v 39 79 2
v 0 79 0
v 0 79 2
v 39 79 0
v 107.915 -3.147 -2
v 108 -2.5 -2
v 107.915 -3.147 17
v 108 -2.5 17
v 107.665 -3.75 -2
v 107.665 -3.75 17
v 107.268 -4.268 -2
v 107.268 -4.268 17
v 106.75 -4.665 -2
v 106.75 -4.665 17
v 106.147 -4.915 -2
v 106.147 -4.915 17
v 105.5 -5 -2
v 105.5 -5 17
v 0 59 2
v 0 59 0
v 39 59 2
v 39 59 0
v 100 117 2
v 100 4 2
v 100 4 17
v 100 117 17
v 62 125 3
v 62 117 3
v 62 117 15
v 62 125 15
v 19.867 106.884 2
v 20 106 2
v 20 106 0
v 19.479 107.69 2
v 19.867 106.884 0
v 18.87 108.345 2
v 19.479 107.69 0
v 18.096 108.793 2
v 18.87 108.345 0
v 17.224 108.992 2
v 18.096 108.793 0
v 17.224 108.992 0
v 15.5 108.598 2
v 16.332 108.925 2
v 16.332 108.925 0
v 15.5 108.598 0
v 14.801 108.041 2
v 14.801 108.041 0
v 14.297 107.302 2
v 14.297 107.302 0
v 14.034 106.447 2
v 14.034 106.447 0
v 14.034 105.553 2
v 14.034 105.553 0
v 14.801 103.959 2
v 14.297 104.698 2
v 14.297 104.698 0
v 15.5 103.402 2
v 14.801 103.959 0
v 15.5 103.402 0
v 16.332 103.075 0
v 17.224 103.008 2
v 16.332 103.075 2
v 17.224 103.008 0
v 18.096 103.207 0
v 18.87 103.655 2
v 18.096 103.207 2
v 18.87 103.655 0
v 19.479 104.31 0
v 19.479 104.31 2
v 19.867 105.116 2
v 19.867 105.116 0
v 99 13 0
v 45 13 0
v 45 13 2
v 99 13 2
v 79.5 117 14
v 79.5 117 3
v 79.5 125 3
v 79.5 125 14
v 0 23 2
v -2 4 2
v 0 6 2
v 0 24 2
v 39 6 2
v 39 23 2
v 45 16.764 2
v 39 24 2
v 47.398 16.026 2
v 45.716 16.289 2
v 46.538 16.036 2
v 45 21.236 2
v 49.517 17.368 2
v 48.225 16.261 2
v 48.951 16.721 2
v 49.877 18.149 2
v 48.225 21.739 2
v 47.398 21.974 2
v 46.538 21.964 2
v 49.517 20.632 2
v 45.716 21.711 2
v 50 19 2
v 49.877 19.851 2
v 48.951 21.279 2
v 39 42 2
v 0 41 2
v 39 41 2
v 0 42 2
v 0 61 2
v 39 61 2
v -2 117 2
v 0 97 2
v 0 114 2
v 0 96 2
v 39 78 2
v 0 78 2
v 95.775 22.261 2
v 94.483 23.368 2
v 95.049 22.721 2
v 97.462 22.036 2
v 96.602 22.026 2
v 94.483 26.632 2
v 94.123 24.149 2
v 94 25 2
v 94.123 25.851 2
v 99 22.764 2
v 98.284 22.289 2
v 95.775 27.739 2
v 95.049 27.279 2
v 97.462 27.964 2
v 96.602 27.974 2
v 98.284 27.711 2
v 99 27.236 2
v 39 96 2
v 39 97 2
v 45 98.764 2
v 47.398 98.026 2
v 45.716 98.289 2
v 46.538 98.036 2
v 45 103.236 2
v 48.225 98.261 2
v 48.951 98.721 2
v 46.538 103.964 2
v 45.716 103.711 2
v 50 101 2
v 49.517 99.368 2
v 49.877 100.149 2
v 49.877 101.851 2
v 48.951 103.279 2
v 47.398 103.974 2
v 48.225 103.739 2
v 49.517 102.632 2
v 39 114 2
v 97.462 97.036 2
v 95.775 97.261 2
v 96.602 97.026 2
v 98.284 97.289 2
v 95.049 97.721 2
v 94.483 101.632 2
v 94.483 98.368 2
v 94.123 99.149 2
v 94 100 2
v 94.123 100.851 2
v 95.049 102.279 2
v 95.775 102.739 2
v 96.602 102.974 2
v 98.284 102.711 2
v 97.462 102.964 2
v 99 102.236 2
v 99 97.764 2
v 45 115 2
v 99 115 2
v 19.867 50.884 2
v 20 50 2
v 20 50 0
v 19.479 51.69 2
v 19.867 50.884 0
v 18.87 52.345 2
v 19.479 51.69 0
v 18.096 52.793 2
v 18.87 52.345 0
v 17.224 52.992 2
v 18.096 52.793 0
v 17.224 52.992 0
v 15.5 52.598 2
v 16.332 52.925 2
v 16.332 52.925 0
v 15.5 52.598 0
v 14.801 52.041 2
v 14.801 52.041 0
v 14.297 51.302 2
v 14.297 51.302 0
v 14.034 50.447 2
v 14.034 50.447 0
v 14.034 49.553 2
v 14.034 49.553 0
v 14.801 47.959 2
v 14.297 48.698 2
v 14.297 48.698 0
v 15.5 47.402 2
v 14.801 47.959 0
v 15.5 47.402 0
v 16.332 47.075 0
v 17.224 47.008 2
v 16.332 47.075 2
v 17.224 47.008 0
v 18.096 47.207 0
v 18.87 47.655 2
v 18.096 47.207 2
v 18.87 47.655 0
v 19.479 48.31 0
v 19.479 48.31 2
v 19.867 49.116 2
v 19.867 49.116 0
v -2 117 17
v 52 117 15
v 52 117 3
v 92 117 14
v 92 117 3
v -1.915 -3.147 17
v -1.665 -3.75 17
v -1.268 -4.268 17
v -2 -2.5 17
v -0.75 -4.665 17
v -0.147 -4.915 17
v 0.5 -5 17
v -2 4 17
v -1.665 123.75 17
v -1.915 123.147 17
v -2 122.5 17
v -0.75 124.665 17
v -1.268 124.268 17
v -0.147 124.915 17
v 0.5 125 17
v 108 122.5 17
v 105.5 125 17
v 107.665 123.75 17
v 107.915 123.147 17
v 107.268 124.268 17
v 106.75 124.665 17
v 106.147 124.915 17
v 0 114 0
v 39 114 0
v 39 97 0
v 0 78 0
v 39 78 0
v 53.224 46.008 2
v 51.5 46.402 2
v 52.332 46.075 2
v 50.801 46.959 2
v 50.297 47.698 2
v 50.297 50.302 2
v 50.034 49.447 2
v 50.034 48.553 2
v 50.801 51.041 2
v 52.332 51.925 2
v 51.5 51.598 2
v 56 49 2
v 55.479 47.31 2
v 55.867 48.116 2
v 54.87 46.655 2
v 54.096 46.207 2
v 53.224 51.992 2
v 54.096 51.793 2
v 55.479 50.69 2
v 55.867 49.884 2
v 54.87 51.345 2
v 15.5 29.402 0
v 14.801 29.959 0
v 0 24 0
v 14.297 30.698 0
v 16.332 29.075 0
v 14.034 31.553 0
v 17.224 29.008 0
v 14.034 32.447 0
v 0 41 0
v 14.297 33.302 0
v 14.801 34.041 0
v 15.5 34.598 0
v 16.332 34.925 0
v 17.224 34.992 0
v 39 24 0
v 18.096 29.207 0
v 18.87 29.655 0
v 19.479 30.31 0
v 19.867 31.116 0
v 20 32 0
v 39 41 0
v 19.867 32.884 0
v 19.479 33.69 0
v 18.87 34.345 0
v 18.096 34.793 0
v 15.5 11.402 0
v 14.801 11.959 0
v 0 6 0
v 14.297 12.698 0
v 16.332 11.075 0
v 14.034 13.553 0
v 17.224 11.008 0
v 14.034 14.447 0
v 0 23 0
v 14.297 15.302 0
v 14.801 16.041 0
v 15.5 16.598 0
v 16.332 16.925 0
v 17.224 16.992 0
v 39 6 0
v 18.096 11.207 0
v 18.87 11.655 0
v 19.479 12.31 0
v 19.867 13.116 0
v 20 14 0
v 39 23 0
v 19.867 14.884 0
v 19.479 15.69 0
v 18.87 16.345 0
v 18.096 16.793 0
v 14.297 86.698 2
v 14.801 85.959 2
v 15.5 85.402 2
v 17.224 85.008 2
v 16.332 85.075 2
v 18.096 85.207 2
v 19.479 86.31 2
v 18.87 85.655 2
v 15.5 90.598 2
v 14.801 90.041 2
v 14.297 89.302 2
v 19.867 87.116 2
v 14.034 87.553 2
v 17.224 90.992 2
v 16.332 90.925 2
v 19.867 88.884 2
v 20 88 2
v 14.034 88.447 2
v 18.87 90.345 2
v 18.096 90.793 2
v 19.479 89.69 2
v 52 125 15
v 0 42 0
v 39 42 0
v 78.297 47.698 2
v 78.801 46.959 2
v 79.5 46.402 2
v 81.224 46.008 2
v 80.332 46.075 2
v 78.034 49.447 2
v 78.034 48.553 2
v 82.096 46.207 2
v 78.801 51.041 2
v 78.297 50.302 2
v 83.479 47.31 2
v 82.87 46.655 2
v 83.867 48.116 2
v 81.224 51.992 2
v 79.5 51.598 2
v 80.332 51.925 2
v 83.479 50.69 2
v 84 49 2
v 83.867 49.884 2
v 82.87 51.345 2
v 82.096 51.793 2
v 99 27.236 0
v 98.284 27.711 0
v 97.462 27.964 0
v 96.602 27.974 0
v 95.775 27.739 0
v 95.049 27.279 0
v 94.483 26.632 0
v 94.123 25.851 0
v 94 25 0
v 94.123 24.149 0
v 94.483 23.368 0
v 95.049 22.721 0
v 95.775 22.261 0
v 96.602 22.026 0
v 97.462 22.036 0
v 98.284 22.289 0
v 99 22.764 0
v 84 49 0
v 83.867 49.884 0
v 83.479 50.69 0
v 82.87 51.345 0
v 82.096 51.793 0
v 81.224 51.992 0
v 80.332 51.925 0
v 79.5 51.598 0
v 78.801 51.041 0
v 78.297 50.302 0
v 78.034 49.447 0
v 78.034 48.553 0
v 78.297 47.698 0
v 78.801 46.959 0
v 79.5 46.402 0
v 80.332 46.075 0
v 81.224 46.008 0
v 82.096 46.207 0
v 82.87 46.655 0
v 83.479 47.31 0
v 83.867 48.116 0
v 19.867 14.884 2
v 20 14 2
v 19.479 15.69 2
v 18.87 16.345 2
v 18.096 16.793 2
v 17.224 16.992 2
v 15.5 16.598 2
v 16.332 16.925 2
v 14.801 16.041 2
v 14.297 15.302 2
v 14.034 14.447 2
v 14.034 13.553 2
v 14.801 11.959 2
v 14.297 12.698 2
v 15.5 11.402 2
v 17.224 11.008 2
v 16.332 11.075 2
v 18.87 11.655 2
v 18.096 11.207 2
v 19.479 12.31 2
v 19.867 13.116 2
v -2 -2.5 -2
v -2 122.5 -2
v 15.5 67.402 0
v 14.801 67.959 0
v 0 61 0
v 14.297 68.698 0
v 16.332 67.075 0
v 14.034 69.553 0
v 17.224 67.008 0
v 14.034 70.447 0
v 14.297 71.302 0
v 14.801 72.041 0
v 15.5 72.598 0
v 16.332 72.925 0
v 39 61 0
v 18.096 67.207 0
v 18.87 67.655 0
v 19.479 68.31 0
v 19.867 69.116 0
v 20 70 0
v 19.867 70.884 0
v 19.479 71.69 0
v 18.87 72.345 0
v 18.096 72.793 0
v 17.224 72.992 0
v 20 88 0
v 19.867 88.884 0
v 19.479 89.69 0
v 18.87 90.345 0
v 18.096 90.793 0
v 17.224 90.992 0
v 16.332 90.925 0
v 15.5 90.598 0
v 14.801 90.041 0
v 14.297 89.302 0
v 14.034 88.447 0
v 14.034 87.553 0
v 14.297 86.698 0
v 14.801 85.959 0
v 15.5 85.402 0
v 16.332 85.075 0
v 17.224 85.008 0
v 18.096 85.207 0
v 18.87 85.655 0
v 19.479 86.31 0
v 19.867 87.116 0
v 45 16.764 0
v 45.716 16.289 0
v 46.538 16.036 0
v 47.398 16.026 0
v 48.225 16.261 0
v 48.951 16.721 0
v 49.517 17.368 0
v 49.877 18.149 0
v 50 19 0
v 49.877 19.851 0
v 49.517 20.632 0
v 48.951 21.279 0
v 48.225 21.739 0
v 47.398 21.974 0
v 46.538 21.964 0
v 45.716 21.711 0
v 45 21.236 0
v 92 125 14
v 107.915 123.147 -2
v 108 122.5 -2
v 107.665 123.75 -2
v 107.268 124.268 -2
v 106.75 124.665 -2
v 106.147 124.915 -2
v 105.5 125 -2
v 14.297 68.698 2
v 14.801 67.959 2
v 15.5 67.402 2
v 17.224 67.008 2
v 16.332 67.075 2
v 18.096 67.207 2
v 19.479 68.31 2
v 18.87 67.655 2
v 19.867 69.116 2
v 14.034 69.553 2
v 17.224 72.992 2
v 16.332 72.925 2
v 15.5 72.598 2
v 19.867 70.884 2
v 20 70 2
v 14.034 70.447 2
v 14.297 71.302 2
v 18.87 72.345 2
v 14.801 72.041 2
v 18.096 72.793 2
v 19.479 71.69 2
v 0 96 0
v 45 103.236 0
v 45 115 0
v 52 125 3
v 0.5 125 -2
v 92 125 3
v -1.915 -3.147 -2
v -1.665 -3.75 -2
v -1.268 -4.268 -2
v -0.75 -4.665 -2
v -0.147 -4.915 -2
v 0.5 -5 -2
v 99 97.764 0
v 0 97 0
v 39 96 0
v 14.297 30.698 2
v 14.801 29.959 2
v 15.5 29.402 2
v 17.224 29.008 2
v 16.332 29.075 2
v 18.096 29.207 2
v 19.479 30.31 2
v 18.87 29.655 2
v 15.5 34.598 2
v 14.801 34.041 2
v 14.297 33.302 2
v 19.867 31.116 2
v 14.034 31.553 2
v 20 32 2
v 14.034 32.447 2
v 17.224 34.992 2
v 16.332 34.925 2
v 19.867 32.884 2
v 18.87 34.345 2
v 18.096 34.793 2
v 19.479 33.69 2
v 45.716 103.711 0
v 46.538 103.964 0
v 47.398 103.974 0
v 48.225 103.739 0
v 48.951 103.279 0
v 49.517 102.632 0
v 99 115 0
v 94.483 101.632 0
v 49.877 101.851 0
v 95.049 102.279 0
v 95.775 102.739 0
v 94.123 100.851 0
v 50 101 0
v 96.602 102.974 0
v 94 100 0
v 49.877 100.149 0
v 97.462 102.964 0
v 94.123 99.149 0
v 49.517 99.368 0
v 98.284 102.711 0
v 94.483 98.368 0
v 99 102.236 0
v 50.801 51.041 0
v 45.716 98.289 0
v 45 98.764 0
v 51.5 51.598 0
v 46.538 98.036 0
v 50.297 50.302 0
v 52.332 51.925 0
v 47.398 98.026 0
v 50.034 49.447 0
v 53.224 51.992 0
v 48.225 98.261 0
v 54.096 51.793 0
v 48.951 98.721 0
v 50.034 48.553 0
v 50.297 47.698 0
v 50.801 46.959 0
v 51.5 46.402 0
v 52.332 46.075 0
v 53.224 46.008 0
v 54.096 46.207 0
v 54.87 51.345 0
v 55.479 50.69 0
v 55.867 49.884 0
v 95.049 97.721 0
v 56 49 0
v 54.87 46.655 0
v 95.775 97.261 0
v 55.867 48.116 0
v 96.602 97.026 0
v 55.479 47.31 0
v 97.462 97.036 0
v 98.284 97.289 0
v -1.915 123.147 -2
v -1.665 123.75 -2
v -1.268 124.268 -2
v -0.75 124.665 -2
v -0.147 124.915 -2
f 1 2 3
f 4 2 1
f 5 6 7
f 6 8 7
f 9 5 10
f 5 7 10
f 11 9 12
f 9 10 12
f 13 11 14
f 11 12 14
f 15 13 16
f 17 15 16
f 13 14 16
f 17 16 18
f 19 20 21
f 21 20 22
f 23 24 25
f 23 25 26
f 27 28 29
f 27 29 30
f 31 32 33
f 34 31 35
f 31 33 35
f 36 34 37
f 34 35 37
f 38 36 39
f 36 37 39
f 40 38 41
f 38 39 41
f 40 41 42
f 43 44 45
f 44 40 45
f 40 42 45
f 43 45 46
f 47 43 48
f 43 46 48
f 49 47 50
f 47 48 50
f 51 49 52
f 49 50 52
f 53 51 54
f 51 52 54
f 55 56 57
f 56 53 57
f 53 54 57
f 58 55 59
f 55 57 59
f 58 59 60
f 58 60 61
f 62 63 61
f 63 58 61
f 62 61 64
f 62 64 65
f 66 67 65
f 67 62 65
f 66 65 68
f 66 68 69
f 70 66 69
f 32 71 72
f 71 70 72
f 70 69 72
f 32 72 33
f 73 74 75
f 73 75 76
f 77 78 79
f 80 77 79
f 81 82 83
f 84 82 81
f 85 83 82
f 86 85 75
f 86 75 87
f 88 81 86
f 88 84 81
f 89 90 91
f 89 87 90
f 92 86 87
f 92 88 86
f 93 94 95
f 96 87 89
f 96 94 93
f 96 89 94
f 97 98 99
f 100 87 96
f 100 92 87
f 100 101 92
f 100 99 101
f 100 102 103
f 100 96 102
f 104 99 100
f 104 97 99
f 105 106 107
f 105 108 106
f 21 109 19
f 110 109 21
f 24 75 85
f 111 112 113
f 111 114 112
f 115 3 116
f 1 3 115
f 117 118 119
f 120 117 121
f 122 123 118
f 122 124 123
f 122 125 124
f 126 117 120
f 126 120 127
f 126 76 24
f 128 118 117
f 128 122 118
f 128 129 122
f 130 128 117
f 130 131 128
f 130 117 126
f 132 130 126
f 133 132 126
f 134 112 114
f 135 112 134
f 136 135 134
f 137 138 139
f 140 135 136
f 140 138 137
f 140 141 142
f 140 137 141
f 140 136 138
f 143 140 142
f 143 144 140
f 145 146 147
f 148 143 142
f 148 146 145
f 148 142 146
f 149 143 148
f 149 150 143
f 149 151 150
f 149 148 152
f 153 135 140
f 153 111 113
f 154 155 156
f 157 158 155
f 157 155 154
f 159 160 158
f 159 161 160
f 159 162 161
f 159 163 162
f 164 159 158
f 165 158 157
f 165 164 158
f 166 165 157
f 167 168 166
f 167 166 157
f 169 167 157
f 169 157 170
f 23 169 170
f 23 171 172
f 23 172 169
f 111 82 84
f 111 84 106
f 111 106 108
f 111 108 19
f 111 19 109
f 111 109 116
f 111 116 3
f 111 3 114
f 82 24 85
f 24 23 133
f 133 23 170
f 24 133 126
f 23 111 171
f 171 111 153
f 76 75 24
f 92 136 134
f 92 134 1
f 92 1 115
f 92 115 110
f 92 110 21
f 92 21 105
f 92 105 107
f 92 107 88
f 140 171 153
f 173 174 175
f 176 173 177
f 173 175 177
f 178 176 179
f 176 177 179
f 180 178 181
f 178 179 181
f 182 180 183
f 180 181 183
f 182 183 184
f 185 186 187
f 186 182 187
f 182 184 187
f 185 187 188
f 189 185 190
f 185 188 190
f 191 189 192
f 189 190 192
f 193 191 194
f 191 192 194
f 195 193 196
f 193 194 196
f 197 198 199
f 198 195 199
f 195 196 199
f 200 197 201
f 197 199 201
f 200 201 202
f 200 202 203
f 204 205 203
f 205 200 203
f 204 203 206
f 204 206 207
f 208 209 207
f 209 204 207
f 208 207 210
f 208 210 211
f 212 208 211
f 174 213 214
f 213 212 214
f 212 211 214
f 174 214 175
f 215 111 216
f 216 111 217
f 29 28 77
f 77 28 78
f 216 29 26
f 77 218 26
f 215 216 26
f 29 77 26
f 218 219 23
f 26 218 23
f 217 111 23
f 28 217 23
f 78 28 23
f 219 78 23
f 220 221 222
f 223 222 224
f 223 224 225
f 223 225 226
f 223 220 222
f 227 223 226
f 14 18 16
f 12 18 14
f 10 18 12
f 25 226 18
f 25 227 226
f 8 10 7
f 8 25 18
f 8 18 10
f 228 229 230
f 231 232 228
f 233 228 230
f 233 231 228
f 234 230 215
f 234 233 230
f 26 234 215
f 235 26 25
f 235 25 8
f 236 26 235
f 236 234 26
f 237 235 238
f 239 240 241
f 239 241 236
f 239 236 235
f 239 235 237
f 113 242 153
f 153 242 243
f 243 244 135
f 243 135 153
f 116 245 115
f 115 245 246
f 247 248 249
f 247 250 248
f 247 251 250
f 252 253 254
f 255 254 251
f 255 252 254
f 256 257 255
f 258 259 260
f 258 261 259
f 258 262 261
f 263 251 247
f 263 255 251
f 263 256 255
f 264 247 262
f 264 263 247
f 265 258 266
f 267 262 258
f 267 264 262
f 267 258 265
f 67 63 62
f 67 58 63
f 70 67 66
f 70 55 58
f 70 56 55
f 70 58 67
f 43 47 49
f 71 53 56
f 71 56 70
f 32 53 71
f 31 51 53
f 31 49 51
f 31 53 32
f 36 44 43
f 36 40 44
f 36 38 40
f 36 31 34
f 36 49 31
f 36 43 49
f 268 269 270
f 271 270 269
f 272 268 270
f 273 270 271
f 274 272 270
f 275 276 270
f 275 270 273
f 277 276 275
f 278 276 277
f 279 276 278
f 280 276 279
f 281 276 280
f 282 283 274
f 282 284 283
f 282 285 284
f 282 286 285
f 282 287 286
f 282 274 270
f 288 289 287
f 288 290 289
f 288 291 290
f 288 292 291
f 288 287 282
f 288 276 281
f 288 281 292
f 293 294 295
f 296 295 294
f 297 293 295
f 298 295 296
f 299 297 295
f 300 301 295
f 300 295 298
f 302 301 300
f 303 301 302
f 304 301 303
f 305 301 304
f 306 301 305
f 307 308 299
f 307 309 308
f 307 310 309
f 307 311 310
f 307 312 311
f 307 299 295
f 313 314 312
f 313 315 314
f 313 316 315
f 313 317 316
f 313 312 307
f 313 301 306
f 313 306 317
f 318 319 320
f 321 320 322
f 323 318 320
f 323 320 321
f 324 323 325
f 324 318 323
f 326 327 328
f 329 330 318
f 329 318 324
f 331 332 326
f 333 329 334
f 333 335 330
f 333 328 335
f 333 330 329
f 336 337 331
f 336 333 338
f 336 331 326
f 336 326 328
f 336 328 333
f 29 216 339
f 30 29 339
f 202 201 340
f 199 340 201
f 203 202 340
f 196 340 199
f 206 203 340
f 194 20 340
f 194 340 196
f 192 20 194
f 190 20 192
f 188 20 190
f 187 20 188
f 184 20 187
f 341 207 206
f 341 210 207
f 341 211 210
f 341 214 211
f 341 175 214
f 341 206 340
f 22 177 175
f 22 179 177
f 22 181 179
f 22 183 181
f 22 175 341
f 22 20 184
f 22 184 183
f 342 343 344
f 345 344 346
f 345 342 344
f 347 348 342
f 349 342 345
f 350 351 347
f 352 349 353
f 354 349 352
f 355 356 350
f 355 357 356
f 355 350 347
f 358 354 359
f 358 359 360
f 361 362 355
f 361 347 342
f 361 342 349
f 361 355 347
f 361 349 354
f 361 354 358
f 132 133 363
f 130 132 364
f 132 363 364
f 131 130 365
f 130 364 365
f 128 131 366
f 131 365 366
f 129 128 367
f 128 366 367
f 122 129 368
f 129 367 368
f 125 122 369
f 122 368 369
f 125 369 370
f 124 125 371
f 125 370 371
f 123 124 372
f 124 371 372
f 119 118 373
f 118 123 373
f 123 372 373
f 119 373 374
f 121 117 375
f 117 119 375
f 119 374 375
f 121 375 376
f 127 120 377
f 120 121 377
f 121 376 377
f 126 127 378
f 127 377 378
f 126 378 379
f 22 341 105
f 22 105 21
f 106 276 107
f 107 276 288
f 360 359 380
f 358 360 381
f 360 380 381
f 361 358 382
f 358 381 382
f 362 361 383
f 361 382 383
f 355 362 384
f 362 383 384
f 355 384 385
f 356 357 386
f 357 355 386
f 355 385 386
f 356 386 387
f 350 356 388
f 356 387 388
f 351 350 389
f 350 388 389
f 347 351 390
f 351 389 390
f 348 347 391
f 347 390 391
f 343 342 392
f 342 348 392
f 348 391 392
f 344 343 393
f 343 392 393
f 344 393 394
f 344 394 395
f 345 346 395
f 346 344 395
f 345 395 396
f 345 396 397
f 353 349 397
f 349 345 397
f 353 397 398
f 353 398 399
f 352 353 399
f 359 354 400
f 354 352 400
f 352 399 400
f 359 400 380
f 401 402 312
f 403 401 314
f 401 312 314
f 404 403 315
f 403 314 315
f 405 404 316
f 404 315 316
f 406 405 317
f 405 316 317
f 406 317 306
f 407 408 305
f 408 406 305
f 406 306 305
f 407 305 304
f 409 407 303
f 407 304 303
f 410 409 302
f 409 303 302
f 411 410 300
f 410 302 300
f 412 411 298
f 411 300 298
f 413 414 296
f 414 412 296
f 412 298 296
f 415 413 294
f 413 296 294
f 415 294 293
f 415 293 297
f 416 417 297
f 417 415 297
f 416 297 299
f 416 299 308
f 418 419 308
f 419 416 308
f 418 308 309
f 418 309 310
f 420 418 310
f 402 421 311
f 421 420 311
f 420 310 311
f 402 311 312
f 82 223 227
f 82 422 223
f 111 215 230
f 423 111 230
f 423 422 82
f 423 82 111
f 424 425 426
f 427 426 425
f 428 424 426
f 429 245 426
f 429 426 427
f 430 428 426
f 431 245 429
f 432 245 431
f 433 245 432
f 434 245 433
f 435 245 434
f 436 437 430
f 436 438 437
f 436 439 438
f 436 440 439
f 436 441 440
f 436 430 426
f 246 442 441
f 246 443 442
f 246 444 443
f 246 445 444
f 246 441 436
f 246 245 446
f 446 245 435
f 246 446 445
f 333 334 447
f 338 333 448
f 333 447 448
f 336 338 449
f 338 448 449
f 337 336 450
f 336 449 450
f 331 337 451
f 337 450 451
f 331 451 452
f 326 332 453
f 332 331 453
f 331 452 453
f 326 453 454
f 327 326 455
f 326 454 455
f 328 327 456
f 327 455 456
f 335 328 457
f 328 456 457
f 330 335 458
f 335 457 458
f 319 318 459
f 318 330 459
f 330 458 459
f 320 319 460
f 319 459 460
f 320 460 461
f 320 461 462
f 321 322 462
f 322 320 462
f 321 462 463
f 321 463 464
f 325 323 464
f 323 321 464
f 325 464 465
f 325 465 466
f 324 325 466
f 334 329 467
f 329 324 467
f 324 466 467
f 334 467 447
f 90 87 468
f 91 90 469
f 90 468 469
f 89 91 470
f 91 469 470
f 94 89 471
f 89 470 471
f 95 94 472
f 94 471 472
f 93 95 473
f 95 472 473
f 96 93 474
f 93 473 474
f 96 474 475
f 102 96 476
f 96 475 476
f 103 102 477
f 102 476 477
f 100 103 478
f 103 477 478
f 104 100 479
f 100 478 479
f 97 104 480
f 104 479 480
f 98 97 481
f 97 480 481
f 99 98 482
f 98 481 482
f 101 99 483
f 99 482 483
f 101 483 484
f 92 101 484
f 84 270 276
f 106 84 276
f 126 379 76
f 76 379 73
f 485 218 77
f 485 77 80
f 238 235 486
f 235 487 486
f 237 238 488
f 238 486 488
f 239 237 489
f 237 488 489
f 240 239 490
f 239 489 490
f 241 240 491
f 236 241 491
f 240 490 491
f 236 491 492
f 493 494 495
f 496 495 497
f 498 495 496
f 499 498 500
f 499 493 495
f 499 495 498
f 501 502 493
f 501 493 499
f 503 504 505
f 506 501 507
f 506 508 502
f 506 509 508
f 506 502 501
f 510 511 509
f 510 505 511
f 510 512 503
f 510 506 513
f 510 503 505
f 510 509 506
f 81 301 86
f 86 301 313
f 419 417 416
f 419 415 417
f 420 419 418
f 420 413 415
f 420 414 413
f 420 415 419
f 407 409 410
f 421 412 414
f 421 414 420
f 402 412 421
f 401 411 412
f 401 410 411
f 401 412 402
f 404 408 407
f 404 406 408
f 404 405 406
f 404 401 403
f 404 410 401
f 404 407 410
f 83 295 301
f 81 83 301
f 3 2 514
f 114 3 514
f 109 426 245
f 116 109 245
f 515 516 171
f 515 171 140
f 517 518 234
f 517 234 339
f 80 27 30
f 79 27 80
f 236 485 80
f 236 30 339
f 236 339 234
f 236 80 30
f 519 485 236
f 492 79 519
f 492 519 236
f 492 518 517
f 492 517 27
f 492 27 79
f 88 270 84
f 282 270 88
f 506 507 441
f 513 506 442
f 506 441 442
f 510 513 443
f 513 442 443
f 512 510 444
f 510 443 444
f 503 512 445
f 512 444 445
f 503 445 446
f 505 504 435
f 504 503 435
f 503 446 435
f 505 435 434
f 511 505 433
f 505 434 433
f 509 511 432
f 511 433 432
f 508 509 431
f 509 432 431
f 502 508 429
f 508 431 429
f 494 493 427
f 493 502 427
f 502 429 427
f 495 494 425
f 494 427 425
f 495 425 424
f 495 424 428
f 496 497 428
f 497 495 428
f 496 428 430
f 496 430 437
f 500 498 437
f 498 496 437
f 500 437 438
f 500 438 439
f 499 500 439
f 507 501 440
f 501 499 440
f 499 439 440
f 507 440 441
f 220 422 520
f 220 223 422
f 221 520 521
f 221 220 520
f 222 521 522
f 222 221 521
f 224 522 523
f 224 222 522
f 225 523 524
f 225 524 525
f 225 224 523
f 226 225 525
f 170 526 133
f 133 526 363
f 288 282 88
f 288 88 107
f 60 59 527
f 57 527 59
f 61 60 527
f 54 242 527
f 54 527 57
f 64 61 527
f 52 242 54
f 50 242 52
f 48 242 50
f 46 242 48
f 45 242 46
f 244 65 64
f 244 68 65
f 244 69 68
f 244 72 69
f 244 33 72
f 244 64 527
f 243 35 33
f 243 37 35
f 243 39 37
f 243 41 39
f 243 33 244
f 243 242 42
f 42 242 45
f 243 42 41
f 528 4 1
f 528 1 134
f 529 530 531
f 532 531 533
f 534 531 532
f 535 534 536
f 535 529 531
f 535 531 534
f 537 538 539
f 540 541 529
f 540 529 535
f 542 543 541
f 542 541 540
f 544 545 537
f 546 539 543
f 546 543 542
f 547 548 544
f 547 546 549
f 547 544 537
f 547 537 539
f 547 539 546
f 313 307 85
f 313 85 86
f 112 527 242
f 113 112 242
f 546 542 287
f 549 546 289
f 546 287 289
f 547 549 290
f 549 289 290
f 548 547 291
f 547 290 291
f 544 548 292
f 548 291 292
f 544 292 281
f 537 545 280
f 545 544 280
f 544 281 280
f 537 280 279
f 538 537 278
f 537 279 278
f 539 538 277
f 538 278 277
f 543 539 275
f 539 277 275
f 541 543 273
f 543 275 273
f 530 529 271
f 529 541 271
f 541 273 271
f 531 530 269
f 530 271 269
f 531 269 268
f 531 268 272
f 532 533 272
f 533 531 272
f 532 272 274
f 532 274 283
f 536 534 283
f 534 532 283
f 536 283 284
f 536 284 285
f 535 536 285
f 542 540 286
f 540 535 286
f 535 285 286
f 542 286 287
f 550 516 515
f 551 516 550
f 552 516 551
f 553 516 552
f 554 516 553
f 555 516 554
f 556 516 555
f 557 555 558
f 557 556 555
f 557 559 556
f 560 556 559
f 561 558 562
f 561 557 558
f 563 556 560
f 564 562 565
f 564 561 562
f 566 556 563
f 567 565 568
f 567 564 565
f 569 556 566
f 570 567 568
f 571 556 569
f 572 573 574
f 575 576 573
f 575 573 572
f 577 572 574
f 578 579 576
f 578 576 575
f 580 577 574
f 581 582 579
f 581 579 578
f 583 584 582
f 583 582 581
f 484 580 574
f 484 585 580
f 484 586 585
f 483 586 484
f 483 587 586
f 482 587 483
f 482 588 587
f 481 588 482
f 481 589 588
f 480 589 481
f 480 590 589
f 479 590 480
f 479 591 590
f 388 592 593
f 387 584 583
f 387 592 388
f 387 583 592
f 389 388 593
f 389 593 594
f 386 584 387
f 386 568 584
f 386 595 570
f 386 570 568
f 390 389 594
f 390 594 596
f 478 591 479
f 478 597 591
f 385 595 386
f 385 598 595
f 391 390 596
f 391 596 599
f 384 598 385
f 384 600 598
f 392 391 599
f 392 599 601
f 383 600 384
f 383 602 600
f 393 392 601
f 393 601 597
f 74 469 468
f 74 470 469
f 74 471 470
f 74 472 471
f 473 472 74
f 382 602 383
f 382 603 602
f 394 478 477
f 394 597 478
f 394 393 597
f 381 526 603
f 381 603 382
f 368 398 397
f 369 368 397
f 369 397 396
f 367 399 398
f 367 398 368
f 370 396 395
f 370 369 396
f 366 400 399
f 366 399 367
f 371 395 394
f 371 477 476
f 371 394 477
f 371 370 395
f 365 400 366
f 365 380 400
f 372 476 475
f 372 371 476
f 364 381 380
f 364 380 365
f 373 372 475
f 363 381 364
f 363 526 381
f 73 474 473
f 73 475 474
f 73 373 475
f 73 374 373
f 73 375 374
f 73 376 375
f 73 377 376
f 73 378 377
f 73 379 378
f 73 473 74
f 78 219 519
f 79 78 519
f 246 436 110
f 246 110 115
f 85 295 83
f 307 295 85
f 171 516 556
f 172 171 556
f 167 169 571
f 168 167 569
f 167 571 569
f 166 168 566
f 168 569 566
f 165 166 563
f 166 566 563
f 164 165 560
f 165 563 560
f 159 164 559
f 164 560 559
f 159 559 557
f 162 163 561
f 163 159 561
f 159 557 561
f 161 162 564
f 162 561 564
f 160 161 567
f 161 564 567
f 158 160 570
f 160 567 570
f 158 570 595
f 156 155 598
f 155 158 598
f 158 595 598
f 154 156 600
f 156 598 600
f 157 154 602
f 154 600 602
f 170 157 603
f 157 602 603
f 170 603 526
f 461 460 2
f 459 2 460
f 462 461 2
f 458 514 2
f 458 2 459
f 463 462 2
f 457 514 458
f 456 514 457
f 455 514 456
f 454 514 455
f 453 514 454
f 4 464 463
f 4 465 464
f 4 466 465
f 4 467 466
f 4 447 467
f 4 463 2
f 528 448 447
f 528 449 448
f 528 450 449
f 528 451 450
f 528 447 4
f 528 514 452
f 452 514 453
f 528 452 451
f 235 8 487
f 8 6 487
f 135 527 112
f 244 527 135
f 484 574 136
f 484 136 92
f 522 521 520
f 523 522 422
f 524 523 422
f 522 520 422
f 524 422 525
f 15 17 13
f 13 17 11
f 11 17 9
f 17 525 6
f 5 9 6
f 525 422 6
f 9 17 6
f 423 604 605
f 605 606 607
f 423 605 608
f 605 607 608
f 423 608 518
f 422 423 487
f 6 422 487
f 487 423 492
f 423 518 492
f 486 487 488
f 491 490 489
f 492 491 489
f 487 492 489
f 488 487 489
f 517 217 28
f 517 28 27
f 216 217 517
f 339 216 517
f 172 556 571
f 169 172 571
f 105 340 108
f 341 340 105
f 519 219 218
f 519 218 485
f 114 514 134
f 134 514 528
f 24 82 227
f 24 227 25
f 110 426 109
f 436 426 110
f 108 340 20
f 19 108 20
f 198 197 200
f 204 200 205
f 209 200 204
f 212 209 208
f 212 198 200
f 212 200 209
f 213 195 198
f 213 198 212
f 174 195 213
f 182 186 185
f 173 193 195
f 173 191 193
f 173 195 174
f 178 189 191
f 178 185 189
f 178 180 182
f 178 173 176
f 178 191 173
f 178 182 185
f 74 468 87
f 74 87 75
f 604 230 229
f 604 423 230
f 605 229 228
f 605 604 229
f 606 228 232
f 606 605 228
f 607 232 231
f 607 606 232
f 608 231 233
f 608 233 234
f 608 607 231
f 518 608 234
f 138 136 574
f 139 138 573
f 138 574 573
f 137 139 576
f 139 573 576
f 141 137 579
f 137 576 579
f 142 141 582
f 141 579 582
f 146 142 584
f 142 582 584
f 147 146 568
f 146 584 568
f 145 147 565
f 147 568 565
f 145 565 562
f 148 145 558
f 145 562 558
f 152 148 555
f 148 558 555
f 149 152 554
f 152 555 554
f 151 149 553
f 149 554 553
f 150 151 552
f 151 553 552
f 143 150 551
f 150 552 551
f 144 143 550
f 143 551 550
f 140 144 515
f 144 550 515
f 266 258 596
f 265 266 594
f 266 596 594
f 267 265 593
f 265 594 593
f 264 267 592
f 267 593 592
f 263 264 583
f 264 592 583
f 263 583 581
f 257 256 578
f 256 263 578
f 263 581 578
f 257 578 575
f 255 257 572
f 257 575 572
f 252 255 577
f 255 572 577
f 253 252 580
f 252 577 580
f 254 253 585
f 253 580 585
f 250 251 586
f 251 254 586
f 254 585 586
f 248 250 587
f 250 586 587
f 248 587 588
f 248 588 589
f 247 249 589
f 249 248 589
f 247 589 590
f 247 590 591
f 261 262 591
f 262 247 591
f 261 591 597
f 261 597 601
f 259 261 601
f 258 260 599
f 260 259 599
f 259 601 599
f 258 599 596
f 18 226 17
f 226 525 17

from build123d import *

# Parameters (mm, degrees)
BOX009_W          = 20
BOX009_H          = 10
BOX009_DEPTH      = 12
BOX008_W          = 20
BOX008_H          = 12.5
BOX008_DEPTH      = 11
BOX011_W          = 102
BOX011_H          = 113
BOX011_DEPTH      = 21
BOX010_W          = 110
BOX010_H          = 130
BOX010_DEPTH      = 19
CYLINDER001_R     = 3
CYLINDER001_DEPTH = 20
BOX006_W          = 39
BOX006_H          = 17
BOX006_DEPTH      = 10
CYLINDER002_R     = 3
CYLINDER002_DEPTH = 20
BOX005_W          = 39
BOX005_H          = 17
BOX005_DEPTH      = 10
CYLINDER003_R     = 3
CYLINDER003_DEPTH = 20
BOX004_W          = 39
BOX004_H          = 17
BOX004_DEPTH      = 10
CYLINDER005_R     = 3
CYLINDER005_DEPTH = 20
BOX002_W          = 39
BOX002_H          = 17
BOX002_DEPTH      = 10
CYLINDER004_R     = 3
CYLINDER004_DEPTH = 20
BOX003_W          = 39
BOX003_H          = 17
BOX003_DEPTH      = 10
CYLINDER011_R     = 3
CYLINDER011_DEPTH = 20
CYLINDER010_R     = 3
CYLINDER010_DEPTH = 20
CYLINDER009_R     = 3
CYLINDER009_DEPTH = 20
CYLINDER008_R     = 3
CYLINDER008_DEPTH = 20
CYLINDER007_R     = 3
CYLINDER007_DEPTH = 20
CYLINDER006_R     = 3
CYLINDER006_DEPTH = 20
BOX007_W          = 102
BOX007_H          = 54
BOX007_DEPTH      = 10
CYLINDER_R        = 3
CYLINDER_DEPTH    = 20
BOX001_W          = 39
BOX001_H          = 17
BOX001_DEPTH      = 10
BOX_W             = 110
BOX_H             = 130
BOX_DEPTH         = 4
FILLET_R          = 2.5


with BuildPart() as dcport:
    # Box009 → Box009 (new body)
    with BuildSketch(Plane(origin=(62, 112, 3), x_dir=(0, 1, 0), z_dir=(0, 0, 1))):
        with Locations((10, 5)):
            Rectangle(BOX009_W, BOX009_H)
    extrude(amount=BOX009_DEPTH)


with BuildPart() as usbport:
    # Box008 → Box008 (new body)
    with BuildSketch(Plane(origin=(92, 112, 3), x_dir=(0, 1, 0), z_dir=(0, 0, 1))):
        with Locations((10, 6.25)):
            Rectangle(BOX008_W, BOX008_H)
    extrude(amount=BOX008_DEPTH)


with BuildPart() as wandung001:
    # Box011 → Box011 (new body)
    with BuildSketch(Plane(origin=(-2, 4, -2), x_dir=(1, 0, 0), z_dir=(0, 0, 1))):
        with Locations((51, 56.5)):
            Rectangle(BOX011_W, BOX011_H)
    extrude(amount=BOX011_DEPTH)


with BuildPart() as wandung003:
    # Box010 → Box010 (new body)
    with BuildSketch(Plane(origin=(-2, -5, -2), x_dir=(1, 0, 0), z_dir=(0, 0, 1))):
        with Locations((55, 65)):
            Rectangle(BOX010_W, BOX010_H)
    extrude(amount=BOX010_DEPTH)

    # Cut019: cut Wandung001
    add(wandung001.part, mode=Mode.SUBTRACT)

    # Cut020: cut Usbport
    add(usbport.part, mode=Mode.SUBTRACT)

    # Cut021: cut DCPort
    add(dcport.part, mode=Mode.SUBTRACT)


with BuildPart() as zylinder001:
    # Cylinder001 → Cylinder001 (new body)
    with BuildSketch(Plane(origin=(17, 32, 0), x_dir=(1, 0, 0), z_dir=(0, 0, 1))):
        Circle(CYLINDER001_R)
    extrude(amount=CYLINDER001_DEPTH)


with BuildPart() as cut001:
    # Box006 → Box006 (new body)
    with BuildSketch(Plane(origin=(0, 24, 0), x_dir=(1, 0, 0), z_dir=(0, 0, 1))):
        with Locations((19.5, 8.5)):
            Rectangle(BOX006_W, BOX006_H)
    extrude(amount=BOX006_DEPTH)

    # Cut001: cut Zylinder001
    add(zylinder001.part, mode=Mode.SUBTRACT)


with BuildPart() as zylinder002:
    # Cylinder002 → Cylinder002 (new body)
    with BuildSketch(Plane(origin=(17, 50, 0), x_dir=(1, 0, 0), z_dir=(0, 0, 1))):
        Circle(CYLINDER002_R)
    extrude(amount=CYLINDER002_DEPTH)


with BuildPart() as cut002:
    # Box005 → Box005 (new body)
    with BuildSketch(Plane(origin=(0, 42, 0), x_dir=(1, 0, 0), z_dir=(0, 0, 1))):
        with Locations((19.5, 8.5)):
            Rectangle(BOX005_W, BOX005_H)
    extrude(amount=BOX005_DEPTH)

    # Cut002: cut Zylinder002
    add(zylinder002.part, mode=Mode.SUBTRACT)


with BuildPart() as zylinder003:
    # Cylinder003 → Cylinder003 (new body)
    with BuildSketch(Plane(origin=(17, 106, 0), x_dir=(1, 0, 0), z_dir=(0, 0, 1))):
        Circle(CYLINDER003_R)
    extrude(amount=CYLINDER003_DEPTH)


with BuildPart() as cut003:
    # Box004 → Box004 (new body)
    with BuildSketch(Plane(origin=(0, 97, 0), x_dir=(1, 0, 0), z_dir=(0, 0, 1))):
        with Locations((19.5, 8.5)):
            Rectangle(BOX004_W, BOX004_H)
    extrude(amount=BOX004_DEPTH)

    # Cut003: cut Zylinder003
    add(zylinder003.part, mode=Mode.SUBTRACT)


with BuildPart() as zylinder005:
    # Cylinder005 → Cylinder005 (new body)
    with BuildSketch(Plane(origin=(17, 70, 0), x_dir=(1, 0, 0), z_dir=(0, 0, 1))):
        Circle(CYLINDER005_R)
    extrude(amount=CYLINDER005_DEPTH)


with BuildPart() as cut005:
    # Box002 → Box002 (new body)
    with BuildSketch(Plane(origin=(0, 61, 0), x_dir=(1, 0, 0), z_dir=(0, 0, 1))):
        with Locations((19.5, 8.5)):
            Rectangle(BOX002_W, BOX002_H)
    extrude(amount=BOX002_DEPTH)

    # Cut005: cut Zylinder005
    add(zylinder005.part, mode=Mode.SUBTRACT)


with BuildPart() as zylinder004:
    # Cylinder004 → Cylinder004 (new body)
    with BuildSketch(Plane(origin=(17, 88, 0), x_dir=(1, 0, 0), z_dir=(0, 0, 1))):
        Circle(CYLINDER004_R)
    extrude(amount=CYLINDER004_DEPTH)


with BuildPart() as cut004:
    # Box003 → Box003 (new body)
    with BuildSketch(Plane(origin=(0, 79, 0), x_dir=(1, 0, 0), z_dir=(0, 0, 1))):
        with Locations((19.5, 8.5)):
            Rectangle(BOX003_W, BOX003_H)
    extrude(amount=BOX003_DEPTH)

    # Cut004: cut Zylinder004
    add(zylinder004.part, mode=Mode.SUBTRACT)


with BuildPart() as zylinder011:
    # Cylinder011 → Cylinder011 (new body)
    with BuildSketch(Plane(origin=(81, 49, 0), x_dir=(1, 0, 0), z_dir=(0, 0, 1))):
        Circle(CYLINDER011_R)
    extrude(amount=CYLINDER011_DEPTH)


with BuildPart() as zylinder010:
    # Cylinder010 → Cylinder010 (new body)
    with BuildSketch(Plane(origin=(53, 49, 0), x_dir=(1, 0, 0), z_dir=(0, 0, 1))):
        Circle(CYLINDER010_R)
    extrude(amount=CYLINDER010_DEPTH)


with BuildPart() as zylinder009:
    # Cylinder009 → Cylinder009 (new body)
    with BuildSketch(Plane(origin=(47, 19, 0), x_dir=(1, 0, 0), z_dir=(0, 0, 1))):
        Circle(CYLINDER009_R)
    extrude(amount=CYLINDER009_DEPTH)


with BuildPart() as zylinder008:
    # Cylinder008 → Cylinder008 (new body)
    with BuildSketch(Plane(origin=(97, 25, 0), x_dir=(1, 0, 0), z_dir=(0, 0, 1))):
        Circle(CYLINDER008_R)
    extrude(amount=CYLINDER008_DEPTH)


with BuildPart() as zylinder007:
    # Cylinder007 → Cylinder007 (new body)
    with BuildSketch(Plane(origin=(47, 101, 0), x_dir=(1, 0, 0), z_dir=(0, 0, 1))):
        Circle(CYLINDER007_R)
    extrude(amount=CYLINDER007_DEPTH)


with BuildPart() as zylinder006:
    # Cylinder006 → Cylinder006 (new body)
    with BuildSketch(Plane(origin=(97, 100, 0), x_dir=(1, 0, 0), z_dir=(0, 0, 1))):
        Circle(CYLINDER006_R)
    extrude(amount=CYLINDER006_DEPTH)


with BuildPart() as cut011:
    # Box007 → Box007 (new body)
    with BuildSketch(Plane(origin=(45, 115, 0), x_dir=(0, -1, 0), z_dir=(0, 0, 1))):
        with Locations((51, 27)):
            Rectangle(BOX007_W, BOX007_H)
    extrude(amount=BOX007_DEPTH)

    # Cut006: cut Zylinder006
    add(zylinder006.part, mode=Mode.SUBTRACT)

    # Cut007: cut Zylinder007
    add(zylinder007.part, mode=Mode.SUBTRACT)

    # Cut008: cut Zylinder008
    add(zylinder008.part, mode=Mode.SUBTRACT)

    # Cut009: cut Zylinder009
    add(zylinder009.part, mode=Mode.SUBTRACT)

    # Cut010: cut Zylinder010
    add(zylinder010.part, mode=Mode.SUBTRACT)

    # Cut011: cut Zylinder011
    add(zylinder011.part, mode=Mode.SUBTRACT)


with BuildPart() as zylinder:
    # Cylinder → Cylinder (new body)
    with BuildSketch(Plane(origin=(17, 14, 0), x_dir=(1, 0, 0), z_dir=(0, 0, 1))):
        Circle(CYLINDER_R)
    extrude(amount=CYLINDER_DEPTH)


with BuildPart() as cut:
    # Box001 → Box001 (new body)
    with BuildSketch(Plane(origin=(0, 6, 0), x_dir=(1, 0, 0), z_dir=(0, 0, 1))):
        with Locations((19.5, 8.5)):
            Rectangle(BOX001_W, BOX001_H)
    extrude(amount=BOX001_DEPTH)

    # Cut: cut Zylinder
    add(zylinder.part, mode=Mode.SUBTRACT)


with BuildPart() as base001:
    # Box → Box (new body)
    with BuildSketch(Plane(origin=(-2, -5, -2), x_dir=(1, 0, 0), z_dir=(0, 0, 1))):
        with Locations((55, 65)):
            Rectangle(BOX_W, BOX_H)
    extrude(amount=BOX_DEPTH)

    # Cut012: cut Cut
    add(cut.part, mode=Mode.SUBTRACT)

    # Cut013: cut Cut011
    add(cut011.part, mode=Mode.SUBTRACT)

    # Cut014: cut Cut004
    add(cut004.part, mode=Mode.SUBTRACT)

    # Cut015: cut Cut005
    add(cut005.part, mode=Mode.SUBTRACT)

    # Cut016: cut Cut003
    add(cut003.part, mode=Mode.SUBTRACT)

    # Cut017: cut Cut002
    add(cut002.part, mode=Mode.SUBTRACT)

    # Cut018: cut Cut001
    add(cut001.part, mode=Mode.SUBTRACT)

    # Fusion: union Wandung003
    add(wandung003.part)

    # Fillet
    fillet_edges = [base001.edges().sort_by_distance(p)[0] for p in [
        (-2, -5, 9.5),
        (108, -5, 9.5),
        (108, 125, 9.5),
        (-2, 125, 9.5),
    ]]
    fillet(fillet_edges, radius=FILLET_R)


solid = base001.part
